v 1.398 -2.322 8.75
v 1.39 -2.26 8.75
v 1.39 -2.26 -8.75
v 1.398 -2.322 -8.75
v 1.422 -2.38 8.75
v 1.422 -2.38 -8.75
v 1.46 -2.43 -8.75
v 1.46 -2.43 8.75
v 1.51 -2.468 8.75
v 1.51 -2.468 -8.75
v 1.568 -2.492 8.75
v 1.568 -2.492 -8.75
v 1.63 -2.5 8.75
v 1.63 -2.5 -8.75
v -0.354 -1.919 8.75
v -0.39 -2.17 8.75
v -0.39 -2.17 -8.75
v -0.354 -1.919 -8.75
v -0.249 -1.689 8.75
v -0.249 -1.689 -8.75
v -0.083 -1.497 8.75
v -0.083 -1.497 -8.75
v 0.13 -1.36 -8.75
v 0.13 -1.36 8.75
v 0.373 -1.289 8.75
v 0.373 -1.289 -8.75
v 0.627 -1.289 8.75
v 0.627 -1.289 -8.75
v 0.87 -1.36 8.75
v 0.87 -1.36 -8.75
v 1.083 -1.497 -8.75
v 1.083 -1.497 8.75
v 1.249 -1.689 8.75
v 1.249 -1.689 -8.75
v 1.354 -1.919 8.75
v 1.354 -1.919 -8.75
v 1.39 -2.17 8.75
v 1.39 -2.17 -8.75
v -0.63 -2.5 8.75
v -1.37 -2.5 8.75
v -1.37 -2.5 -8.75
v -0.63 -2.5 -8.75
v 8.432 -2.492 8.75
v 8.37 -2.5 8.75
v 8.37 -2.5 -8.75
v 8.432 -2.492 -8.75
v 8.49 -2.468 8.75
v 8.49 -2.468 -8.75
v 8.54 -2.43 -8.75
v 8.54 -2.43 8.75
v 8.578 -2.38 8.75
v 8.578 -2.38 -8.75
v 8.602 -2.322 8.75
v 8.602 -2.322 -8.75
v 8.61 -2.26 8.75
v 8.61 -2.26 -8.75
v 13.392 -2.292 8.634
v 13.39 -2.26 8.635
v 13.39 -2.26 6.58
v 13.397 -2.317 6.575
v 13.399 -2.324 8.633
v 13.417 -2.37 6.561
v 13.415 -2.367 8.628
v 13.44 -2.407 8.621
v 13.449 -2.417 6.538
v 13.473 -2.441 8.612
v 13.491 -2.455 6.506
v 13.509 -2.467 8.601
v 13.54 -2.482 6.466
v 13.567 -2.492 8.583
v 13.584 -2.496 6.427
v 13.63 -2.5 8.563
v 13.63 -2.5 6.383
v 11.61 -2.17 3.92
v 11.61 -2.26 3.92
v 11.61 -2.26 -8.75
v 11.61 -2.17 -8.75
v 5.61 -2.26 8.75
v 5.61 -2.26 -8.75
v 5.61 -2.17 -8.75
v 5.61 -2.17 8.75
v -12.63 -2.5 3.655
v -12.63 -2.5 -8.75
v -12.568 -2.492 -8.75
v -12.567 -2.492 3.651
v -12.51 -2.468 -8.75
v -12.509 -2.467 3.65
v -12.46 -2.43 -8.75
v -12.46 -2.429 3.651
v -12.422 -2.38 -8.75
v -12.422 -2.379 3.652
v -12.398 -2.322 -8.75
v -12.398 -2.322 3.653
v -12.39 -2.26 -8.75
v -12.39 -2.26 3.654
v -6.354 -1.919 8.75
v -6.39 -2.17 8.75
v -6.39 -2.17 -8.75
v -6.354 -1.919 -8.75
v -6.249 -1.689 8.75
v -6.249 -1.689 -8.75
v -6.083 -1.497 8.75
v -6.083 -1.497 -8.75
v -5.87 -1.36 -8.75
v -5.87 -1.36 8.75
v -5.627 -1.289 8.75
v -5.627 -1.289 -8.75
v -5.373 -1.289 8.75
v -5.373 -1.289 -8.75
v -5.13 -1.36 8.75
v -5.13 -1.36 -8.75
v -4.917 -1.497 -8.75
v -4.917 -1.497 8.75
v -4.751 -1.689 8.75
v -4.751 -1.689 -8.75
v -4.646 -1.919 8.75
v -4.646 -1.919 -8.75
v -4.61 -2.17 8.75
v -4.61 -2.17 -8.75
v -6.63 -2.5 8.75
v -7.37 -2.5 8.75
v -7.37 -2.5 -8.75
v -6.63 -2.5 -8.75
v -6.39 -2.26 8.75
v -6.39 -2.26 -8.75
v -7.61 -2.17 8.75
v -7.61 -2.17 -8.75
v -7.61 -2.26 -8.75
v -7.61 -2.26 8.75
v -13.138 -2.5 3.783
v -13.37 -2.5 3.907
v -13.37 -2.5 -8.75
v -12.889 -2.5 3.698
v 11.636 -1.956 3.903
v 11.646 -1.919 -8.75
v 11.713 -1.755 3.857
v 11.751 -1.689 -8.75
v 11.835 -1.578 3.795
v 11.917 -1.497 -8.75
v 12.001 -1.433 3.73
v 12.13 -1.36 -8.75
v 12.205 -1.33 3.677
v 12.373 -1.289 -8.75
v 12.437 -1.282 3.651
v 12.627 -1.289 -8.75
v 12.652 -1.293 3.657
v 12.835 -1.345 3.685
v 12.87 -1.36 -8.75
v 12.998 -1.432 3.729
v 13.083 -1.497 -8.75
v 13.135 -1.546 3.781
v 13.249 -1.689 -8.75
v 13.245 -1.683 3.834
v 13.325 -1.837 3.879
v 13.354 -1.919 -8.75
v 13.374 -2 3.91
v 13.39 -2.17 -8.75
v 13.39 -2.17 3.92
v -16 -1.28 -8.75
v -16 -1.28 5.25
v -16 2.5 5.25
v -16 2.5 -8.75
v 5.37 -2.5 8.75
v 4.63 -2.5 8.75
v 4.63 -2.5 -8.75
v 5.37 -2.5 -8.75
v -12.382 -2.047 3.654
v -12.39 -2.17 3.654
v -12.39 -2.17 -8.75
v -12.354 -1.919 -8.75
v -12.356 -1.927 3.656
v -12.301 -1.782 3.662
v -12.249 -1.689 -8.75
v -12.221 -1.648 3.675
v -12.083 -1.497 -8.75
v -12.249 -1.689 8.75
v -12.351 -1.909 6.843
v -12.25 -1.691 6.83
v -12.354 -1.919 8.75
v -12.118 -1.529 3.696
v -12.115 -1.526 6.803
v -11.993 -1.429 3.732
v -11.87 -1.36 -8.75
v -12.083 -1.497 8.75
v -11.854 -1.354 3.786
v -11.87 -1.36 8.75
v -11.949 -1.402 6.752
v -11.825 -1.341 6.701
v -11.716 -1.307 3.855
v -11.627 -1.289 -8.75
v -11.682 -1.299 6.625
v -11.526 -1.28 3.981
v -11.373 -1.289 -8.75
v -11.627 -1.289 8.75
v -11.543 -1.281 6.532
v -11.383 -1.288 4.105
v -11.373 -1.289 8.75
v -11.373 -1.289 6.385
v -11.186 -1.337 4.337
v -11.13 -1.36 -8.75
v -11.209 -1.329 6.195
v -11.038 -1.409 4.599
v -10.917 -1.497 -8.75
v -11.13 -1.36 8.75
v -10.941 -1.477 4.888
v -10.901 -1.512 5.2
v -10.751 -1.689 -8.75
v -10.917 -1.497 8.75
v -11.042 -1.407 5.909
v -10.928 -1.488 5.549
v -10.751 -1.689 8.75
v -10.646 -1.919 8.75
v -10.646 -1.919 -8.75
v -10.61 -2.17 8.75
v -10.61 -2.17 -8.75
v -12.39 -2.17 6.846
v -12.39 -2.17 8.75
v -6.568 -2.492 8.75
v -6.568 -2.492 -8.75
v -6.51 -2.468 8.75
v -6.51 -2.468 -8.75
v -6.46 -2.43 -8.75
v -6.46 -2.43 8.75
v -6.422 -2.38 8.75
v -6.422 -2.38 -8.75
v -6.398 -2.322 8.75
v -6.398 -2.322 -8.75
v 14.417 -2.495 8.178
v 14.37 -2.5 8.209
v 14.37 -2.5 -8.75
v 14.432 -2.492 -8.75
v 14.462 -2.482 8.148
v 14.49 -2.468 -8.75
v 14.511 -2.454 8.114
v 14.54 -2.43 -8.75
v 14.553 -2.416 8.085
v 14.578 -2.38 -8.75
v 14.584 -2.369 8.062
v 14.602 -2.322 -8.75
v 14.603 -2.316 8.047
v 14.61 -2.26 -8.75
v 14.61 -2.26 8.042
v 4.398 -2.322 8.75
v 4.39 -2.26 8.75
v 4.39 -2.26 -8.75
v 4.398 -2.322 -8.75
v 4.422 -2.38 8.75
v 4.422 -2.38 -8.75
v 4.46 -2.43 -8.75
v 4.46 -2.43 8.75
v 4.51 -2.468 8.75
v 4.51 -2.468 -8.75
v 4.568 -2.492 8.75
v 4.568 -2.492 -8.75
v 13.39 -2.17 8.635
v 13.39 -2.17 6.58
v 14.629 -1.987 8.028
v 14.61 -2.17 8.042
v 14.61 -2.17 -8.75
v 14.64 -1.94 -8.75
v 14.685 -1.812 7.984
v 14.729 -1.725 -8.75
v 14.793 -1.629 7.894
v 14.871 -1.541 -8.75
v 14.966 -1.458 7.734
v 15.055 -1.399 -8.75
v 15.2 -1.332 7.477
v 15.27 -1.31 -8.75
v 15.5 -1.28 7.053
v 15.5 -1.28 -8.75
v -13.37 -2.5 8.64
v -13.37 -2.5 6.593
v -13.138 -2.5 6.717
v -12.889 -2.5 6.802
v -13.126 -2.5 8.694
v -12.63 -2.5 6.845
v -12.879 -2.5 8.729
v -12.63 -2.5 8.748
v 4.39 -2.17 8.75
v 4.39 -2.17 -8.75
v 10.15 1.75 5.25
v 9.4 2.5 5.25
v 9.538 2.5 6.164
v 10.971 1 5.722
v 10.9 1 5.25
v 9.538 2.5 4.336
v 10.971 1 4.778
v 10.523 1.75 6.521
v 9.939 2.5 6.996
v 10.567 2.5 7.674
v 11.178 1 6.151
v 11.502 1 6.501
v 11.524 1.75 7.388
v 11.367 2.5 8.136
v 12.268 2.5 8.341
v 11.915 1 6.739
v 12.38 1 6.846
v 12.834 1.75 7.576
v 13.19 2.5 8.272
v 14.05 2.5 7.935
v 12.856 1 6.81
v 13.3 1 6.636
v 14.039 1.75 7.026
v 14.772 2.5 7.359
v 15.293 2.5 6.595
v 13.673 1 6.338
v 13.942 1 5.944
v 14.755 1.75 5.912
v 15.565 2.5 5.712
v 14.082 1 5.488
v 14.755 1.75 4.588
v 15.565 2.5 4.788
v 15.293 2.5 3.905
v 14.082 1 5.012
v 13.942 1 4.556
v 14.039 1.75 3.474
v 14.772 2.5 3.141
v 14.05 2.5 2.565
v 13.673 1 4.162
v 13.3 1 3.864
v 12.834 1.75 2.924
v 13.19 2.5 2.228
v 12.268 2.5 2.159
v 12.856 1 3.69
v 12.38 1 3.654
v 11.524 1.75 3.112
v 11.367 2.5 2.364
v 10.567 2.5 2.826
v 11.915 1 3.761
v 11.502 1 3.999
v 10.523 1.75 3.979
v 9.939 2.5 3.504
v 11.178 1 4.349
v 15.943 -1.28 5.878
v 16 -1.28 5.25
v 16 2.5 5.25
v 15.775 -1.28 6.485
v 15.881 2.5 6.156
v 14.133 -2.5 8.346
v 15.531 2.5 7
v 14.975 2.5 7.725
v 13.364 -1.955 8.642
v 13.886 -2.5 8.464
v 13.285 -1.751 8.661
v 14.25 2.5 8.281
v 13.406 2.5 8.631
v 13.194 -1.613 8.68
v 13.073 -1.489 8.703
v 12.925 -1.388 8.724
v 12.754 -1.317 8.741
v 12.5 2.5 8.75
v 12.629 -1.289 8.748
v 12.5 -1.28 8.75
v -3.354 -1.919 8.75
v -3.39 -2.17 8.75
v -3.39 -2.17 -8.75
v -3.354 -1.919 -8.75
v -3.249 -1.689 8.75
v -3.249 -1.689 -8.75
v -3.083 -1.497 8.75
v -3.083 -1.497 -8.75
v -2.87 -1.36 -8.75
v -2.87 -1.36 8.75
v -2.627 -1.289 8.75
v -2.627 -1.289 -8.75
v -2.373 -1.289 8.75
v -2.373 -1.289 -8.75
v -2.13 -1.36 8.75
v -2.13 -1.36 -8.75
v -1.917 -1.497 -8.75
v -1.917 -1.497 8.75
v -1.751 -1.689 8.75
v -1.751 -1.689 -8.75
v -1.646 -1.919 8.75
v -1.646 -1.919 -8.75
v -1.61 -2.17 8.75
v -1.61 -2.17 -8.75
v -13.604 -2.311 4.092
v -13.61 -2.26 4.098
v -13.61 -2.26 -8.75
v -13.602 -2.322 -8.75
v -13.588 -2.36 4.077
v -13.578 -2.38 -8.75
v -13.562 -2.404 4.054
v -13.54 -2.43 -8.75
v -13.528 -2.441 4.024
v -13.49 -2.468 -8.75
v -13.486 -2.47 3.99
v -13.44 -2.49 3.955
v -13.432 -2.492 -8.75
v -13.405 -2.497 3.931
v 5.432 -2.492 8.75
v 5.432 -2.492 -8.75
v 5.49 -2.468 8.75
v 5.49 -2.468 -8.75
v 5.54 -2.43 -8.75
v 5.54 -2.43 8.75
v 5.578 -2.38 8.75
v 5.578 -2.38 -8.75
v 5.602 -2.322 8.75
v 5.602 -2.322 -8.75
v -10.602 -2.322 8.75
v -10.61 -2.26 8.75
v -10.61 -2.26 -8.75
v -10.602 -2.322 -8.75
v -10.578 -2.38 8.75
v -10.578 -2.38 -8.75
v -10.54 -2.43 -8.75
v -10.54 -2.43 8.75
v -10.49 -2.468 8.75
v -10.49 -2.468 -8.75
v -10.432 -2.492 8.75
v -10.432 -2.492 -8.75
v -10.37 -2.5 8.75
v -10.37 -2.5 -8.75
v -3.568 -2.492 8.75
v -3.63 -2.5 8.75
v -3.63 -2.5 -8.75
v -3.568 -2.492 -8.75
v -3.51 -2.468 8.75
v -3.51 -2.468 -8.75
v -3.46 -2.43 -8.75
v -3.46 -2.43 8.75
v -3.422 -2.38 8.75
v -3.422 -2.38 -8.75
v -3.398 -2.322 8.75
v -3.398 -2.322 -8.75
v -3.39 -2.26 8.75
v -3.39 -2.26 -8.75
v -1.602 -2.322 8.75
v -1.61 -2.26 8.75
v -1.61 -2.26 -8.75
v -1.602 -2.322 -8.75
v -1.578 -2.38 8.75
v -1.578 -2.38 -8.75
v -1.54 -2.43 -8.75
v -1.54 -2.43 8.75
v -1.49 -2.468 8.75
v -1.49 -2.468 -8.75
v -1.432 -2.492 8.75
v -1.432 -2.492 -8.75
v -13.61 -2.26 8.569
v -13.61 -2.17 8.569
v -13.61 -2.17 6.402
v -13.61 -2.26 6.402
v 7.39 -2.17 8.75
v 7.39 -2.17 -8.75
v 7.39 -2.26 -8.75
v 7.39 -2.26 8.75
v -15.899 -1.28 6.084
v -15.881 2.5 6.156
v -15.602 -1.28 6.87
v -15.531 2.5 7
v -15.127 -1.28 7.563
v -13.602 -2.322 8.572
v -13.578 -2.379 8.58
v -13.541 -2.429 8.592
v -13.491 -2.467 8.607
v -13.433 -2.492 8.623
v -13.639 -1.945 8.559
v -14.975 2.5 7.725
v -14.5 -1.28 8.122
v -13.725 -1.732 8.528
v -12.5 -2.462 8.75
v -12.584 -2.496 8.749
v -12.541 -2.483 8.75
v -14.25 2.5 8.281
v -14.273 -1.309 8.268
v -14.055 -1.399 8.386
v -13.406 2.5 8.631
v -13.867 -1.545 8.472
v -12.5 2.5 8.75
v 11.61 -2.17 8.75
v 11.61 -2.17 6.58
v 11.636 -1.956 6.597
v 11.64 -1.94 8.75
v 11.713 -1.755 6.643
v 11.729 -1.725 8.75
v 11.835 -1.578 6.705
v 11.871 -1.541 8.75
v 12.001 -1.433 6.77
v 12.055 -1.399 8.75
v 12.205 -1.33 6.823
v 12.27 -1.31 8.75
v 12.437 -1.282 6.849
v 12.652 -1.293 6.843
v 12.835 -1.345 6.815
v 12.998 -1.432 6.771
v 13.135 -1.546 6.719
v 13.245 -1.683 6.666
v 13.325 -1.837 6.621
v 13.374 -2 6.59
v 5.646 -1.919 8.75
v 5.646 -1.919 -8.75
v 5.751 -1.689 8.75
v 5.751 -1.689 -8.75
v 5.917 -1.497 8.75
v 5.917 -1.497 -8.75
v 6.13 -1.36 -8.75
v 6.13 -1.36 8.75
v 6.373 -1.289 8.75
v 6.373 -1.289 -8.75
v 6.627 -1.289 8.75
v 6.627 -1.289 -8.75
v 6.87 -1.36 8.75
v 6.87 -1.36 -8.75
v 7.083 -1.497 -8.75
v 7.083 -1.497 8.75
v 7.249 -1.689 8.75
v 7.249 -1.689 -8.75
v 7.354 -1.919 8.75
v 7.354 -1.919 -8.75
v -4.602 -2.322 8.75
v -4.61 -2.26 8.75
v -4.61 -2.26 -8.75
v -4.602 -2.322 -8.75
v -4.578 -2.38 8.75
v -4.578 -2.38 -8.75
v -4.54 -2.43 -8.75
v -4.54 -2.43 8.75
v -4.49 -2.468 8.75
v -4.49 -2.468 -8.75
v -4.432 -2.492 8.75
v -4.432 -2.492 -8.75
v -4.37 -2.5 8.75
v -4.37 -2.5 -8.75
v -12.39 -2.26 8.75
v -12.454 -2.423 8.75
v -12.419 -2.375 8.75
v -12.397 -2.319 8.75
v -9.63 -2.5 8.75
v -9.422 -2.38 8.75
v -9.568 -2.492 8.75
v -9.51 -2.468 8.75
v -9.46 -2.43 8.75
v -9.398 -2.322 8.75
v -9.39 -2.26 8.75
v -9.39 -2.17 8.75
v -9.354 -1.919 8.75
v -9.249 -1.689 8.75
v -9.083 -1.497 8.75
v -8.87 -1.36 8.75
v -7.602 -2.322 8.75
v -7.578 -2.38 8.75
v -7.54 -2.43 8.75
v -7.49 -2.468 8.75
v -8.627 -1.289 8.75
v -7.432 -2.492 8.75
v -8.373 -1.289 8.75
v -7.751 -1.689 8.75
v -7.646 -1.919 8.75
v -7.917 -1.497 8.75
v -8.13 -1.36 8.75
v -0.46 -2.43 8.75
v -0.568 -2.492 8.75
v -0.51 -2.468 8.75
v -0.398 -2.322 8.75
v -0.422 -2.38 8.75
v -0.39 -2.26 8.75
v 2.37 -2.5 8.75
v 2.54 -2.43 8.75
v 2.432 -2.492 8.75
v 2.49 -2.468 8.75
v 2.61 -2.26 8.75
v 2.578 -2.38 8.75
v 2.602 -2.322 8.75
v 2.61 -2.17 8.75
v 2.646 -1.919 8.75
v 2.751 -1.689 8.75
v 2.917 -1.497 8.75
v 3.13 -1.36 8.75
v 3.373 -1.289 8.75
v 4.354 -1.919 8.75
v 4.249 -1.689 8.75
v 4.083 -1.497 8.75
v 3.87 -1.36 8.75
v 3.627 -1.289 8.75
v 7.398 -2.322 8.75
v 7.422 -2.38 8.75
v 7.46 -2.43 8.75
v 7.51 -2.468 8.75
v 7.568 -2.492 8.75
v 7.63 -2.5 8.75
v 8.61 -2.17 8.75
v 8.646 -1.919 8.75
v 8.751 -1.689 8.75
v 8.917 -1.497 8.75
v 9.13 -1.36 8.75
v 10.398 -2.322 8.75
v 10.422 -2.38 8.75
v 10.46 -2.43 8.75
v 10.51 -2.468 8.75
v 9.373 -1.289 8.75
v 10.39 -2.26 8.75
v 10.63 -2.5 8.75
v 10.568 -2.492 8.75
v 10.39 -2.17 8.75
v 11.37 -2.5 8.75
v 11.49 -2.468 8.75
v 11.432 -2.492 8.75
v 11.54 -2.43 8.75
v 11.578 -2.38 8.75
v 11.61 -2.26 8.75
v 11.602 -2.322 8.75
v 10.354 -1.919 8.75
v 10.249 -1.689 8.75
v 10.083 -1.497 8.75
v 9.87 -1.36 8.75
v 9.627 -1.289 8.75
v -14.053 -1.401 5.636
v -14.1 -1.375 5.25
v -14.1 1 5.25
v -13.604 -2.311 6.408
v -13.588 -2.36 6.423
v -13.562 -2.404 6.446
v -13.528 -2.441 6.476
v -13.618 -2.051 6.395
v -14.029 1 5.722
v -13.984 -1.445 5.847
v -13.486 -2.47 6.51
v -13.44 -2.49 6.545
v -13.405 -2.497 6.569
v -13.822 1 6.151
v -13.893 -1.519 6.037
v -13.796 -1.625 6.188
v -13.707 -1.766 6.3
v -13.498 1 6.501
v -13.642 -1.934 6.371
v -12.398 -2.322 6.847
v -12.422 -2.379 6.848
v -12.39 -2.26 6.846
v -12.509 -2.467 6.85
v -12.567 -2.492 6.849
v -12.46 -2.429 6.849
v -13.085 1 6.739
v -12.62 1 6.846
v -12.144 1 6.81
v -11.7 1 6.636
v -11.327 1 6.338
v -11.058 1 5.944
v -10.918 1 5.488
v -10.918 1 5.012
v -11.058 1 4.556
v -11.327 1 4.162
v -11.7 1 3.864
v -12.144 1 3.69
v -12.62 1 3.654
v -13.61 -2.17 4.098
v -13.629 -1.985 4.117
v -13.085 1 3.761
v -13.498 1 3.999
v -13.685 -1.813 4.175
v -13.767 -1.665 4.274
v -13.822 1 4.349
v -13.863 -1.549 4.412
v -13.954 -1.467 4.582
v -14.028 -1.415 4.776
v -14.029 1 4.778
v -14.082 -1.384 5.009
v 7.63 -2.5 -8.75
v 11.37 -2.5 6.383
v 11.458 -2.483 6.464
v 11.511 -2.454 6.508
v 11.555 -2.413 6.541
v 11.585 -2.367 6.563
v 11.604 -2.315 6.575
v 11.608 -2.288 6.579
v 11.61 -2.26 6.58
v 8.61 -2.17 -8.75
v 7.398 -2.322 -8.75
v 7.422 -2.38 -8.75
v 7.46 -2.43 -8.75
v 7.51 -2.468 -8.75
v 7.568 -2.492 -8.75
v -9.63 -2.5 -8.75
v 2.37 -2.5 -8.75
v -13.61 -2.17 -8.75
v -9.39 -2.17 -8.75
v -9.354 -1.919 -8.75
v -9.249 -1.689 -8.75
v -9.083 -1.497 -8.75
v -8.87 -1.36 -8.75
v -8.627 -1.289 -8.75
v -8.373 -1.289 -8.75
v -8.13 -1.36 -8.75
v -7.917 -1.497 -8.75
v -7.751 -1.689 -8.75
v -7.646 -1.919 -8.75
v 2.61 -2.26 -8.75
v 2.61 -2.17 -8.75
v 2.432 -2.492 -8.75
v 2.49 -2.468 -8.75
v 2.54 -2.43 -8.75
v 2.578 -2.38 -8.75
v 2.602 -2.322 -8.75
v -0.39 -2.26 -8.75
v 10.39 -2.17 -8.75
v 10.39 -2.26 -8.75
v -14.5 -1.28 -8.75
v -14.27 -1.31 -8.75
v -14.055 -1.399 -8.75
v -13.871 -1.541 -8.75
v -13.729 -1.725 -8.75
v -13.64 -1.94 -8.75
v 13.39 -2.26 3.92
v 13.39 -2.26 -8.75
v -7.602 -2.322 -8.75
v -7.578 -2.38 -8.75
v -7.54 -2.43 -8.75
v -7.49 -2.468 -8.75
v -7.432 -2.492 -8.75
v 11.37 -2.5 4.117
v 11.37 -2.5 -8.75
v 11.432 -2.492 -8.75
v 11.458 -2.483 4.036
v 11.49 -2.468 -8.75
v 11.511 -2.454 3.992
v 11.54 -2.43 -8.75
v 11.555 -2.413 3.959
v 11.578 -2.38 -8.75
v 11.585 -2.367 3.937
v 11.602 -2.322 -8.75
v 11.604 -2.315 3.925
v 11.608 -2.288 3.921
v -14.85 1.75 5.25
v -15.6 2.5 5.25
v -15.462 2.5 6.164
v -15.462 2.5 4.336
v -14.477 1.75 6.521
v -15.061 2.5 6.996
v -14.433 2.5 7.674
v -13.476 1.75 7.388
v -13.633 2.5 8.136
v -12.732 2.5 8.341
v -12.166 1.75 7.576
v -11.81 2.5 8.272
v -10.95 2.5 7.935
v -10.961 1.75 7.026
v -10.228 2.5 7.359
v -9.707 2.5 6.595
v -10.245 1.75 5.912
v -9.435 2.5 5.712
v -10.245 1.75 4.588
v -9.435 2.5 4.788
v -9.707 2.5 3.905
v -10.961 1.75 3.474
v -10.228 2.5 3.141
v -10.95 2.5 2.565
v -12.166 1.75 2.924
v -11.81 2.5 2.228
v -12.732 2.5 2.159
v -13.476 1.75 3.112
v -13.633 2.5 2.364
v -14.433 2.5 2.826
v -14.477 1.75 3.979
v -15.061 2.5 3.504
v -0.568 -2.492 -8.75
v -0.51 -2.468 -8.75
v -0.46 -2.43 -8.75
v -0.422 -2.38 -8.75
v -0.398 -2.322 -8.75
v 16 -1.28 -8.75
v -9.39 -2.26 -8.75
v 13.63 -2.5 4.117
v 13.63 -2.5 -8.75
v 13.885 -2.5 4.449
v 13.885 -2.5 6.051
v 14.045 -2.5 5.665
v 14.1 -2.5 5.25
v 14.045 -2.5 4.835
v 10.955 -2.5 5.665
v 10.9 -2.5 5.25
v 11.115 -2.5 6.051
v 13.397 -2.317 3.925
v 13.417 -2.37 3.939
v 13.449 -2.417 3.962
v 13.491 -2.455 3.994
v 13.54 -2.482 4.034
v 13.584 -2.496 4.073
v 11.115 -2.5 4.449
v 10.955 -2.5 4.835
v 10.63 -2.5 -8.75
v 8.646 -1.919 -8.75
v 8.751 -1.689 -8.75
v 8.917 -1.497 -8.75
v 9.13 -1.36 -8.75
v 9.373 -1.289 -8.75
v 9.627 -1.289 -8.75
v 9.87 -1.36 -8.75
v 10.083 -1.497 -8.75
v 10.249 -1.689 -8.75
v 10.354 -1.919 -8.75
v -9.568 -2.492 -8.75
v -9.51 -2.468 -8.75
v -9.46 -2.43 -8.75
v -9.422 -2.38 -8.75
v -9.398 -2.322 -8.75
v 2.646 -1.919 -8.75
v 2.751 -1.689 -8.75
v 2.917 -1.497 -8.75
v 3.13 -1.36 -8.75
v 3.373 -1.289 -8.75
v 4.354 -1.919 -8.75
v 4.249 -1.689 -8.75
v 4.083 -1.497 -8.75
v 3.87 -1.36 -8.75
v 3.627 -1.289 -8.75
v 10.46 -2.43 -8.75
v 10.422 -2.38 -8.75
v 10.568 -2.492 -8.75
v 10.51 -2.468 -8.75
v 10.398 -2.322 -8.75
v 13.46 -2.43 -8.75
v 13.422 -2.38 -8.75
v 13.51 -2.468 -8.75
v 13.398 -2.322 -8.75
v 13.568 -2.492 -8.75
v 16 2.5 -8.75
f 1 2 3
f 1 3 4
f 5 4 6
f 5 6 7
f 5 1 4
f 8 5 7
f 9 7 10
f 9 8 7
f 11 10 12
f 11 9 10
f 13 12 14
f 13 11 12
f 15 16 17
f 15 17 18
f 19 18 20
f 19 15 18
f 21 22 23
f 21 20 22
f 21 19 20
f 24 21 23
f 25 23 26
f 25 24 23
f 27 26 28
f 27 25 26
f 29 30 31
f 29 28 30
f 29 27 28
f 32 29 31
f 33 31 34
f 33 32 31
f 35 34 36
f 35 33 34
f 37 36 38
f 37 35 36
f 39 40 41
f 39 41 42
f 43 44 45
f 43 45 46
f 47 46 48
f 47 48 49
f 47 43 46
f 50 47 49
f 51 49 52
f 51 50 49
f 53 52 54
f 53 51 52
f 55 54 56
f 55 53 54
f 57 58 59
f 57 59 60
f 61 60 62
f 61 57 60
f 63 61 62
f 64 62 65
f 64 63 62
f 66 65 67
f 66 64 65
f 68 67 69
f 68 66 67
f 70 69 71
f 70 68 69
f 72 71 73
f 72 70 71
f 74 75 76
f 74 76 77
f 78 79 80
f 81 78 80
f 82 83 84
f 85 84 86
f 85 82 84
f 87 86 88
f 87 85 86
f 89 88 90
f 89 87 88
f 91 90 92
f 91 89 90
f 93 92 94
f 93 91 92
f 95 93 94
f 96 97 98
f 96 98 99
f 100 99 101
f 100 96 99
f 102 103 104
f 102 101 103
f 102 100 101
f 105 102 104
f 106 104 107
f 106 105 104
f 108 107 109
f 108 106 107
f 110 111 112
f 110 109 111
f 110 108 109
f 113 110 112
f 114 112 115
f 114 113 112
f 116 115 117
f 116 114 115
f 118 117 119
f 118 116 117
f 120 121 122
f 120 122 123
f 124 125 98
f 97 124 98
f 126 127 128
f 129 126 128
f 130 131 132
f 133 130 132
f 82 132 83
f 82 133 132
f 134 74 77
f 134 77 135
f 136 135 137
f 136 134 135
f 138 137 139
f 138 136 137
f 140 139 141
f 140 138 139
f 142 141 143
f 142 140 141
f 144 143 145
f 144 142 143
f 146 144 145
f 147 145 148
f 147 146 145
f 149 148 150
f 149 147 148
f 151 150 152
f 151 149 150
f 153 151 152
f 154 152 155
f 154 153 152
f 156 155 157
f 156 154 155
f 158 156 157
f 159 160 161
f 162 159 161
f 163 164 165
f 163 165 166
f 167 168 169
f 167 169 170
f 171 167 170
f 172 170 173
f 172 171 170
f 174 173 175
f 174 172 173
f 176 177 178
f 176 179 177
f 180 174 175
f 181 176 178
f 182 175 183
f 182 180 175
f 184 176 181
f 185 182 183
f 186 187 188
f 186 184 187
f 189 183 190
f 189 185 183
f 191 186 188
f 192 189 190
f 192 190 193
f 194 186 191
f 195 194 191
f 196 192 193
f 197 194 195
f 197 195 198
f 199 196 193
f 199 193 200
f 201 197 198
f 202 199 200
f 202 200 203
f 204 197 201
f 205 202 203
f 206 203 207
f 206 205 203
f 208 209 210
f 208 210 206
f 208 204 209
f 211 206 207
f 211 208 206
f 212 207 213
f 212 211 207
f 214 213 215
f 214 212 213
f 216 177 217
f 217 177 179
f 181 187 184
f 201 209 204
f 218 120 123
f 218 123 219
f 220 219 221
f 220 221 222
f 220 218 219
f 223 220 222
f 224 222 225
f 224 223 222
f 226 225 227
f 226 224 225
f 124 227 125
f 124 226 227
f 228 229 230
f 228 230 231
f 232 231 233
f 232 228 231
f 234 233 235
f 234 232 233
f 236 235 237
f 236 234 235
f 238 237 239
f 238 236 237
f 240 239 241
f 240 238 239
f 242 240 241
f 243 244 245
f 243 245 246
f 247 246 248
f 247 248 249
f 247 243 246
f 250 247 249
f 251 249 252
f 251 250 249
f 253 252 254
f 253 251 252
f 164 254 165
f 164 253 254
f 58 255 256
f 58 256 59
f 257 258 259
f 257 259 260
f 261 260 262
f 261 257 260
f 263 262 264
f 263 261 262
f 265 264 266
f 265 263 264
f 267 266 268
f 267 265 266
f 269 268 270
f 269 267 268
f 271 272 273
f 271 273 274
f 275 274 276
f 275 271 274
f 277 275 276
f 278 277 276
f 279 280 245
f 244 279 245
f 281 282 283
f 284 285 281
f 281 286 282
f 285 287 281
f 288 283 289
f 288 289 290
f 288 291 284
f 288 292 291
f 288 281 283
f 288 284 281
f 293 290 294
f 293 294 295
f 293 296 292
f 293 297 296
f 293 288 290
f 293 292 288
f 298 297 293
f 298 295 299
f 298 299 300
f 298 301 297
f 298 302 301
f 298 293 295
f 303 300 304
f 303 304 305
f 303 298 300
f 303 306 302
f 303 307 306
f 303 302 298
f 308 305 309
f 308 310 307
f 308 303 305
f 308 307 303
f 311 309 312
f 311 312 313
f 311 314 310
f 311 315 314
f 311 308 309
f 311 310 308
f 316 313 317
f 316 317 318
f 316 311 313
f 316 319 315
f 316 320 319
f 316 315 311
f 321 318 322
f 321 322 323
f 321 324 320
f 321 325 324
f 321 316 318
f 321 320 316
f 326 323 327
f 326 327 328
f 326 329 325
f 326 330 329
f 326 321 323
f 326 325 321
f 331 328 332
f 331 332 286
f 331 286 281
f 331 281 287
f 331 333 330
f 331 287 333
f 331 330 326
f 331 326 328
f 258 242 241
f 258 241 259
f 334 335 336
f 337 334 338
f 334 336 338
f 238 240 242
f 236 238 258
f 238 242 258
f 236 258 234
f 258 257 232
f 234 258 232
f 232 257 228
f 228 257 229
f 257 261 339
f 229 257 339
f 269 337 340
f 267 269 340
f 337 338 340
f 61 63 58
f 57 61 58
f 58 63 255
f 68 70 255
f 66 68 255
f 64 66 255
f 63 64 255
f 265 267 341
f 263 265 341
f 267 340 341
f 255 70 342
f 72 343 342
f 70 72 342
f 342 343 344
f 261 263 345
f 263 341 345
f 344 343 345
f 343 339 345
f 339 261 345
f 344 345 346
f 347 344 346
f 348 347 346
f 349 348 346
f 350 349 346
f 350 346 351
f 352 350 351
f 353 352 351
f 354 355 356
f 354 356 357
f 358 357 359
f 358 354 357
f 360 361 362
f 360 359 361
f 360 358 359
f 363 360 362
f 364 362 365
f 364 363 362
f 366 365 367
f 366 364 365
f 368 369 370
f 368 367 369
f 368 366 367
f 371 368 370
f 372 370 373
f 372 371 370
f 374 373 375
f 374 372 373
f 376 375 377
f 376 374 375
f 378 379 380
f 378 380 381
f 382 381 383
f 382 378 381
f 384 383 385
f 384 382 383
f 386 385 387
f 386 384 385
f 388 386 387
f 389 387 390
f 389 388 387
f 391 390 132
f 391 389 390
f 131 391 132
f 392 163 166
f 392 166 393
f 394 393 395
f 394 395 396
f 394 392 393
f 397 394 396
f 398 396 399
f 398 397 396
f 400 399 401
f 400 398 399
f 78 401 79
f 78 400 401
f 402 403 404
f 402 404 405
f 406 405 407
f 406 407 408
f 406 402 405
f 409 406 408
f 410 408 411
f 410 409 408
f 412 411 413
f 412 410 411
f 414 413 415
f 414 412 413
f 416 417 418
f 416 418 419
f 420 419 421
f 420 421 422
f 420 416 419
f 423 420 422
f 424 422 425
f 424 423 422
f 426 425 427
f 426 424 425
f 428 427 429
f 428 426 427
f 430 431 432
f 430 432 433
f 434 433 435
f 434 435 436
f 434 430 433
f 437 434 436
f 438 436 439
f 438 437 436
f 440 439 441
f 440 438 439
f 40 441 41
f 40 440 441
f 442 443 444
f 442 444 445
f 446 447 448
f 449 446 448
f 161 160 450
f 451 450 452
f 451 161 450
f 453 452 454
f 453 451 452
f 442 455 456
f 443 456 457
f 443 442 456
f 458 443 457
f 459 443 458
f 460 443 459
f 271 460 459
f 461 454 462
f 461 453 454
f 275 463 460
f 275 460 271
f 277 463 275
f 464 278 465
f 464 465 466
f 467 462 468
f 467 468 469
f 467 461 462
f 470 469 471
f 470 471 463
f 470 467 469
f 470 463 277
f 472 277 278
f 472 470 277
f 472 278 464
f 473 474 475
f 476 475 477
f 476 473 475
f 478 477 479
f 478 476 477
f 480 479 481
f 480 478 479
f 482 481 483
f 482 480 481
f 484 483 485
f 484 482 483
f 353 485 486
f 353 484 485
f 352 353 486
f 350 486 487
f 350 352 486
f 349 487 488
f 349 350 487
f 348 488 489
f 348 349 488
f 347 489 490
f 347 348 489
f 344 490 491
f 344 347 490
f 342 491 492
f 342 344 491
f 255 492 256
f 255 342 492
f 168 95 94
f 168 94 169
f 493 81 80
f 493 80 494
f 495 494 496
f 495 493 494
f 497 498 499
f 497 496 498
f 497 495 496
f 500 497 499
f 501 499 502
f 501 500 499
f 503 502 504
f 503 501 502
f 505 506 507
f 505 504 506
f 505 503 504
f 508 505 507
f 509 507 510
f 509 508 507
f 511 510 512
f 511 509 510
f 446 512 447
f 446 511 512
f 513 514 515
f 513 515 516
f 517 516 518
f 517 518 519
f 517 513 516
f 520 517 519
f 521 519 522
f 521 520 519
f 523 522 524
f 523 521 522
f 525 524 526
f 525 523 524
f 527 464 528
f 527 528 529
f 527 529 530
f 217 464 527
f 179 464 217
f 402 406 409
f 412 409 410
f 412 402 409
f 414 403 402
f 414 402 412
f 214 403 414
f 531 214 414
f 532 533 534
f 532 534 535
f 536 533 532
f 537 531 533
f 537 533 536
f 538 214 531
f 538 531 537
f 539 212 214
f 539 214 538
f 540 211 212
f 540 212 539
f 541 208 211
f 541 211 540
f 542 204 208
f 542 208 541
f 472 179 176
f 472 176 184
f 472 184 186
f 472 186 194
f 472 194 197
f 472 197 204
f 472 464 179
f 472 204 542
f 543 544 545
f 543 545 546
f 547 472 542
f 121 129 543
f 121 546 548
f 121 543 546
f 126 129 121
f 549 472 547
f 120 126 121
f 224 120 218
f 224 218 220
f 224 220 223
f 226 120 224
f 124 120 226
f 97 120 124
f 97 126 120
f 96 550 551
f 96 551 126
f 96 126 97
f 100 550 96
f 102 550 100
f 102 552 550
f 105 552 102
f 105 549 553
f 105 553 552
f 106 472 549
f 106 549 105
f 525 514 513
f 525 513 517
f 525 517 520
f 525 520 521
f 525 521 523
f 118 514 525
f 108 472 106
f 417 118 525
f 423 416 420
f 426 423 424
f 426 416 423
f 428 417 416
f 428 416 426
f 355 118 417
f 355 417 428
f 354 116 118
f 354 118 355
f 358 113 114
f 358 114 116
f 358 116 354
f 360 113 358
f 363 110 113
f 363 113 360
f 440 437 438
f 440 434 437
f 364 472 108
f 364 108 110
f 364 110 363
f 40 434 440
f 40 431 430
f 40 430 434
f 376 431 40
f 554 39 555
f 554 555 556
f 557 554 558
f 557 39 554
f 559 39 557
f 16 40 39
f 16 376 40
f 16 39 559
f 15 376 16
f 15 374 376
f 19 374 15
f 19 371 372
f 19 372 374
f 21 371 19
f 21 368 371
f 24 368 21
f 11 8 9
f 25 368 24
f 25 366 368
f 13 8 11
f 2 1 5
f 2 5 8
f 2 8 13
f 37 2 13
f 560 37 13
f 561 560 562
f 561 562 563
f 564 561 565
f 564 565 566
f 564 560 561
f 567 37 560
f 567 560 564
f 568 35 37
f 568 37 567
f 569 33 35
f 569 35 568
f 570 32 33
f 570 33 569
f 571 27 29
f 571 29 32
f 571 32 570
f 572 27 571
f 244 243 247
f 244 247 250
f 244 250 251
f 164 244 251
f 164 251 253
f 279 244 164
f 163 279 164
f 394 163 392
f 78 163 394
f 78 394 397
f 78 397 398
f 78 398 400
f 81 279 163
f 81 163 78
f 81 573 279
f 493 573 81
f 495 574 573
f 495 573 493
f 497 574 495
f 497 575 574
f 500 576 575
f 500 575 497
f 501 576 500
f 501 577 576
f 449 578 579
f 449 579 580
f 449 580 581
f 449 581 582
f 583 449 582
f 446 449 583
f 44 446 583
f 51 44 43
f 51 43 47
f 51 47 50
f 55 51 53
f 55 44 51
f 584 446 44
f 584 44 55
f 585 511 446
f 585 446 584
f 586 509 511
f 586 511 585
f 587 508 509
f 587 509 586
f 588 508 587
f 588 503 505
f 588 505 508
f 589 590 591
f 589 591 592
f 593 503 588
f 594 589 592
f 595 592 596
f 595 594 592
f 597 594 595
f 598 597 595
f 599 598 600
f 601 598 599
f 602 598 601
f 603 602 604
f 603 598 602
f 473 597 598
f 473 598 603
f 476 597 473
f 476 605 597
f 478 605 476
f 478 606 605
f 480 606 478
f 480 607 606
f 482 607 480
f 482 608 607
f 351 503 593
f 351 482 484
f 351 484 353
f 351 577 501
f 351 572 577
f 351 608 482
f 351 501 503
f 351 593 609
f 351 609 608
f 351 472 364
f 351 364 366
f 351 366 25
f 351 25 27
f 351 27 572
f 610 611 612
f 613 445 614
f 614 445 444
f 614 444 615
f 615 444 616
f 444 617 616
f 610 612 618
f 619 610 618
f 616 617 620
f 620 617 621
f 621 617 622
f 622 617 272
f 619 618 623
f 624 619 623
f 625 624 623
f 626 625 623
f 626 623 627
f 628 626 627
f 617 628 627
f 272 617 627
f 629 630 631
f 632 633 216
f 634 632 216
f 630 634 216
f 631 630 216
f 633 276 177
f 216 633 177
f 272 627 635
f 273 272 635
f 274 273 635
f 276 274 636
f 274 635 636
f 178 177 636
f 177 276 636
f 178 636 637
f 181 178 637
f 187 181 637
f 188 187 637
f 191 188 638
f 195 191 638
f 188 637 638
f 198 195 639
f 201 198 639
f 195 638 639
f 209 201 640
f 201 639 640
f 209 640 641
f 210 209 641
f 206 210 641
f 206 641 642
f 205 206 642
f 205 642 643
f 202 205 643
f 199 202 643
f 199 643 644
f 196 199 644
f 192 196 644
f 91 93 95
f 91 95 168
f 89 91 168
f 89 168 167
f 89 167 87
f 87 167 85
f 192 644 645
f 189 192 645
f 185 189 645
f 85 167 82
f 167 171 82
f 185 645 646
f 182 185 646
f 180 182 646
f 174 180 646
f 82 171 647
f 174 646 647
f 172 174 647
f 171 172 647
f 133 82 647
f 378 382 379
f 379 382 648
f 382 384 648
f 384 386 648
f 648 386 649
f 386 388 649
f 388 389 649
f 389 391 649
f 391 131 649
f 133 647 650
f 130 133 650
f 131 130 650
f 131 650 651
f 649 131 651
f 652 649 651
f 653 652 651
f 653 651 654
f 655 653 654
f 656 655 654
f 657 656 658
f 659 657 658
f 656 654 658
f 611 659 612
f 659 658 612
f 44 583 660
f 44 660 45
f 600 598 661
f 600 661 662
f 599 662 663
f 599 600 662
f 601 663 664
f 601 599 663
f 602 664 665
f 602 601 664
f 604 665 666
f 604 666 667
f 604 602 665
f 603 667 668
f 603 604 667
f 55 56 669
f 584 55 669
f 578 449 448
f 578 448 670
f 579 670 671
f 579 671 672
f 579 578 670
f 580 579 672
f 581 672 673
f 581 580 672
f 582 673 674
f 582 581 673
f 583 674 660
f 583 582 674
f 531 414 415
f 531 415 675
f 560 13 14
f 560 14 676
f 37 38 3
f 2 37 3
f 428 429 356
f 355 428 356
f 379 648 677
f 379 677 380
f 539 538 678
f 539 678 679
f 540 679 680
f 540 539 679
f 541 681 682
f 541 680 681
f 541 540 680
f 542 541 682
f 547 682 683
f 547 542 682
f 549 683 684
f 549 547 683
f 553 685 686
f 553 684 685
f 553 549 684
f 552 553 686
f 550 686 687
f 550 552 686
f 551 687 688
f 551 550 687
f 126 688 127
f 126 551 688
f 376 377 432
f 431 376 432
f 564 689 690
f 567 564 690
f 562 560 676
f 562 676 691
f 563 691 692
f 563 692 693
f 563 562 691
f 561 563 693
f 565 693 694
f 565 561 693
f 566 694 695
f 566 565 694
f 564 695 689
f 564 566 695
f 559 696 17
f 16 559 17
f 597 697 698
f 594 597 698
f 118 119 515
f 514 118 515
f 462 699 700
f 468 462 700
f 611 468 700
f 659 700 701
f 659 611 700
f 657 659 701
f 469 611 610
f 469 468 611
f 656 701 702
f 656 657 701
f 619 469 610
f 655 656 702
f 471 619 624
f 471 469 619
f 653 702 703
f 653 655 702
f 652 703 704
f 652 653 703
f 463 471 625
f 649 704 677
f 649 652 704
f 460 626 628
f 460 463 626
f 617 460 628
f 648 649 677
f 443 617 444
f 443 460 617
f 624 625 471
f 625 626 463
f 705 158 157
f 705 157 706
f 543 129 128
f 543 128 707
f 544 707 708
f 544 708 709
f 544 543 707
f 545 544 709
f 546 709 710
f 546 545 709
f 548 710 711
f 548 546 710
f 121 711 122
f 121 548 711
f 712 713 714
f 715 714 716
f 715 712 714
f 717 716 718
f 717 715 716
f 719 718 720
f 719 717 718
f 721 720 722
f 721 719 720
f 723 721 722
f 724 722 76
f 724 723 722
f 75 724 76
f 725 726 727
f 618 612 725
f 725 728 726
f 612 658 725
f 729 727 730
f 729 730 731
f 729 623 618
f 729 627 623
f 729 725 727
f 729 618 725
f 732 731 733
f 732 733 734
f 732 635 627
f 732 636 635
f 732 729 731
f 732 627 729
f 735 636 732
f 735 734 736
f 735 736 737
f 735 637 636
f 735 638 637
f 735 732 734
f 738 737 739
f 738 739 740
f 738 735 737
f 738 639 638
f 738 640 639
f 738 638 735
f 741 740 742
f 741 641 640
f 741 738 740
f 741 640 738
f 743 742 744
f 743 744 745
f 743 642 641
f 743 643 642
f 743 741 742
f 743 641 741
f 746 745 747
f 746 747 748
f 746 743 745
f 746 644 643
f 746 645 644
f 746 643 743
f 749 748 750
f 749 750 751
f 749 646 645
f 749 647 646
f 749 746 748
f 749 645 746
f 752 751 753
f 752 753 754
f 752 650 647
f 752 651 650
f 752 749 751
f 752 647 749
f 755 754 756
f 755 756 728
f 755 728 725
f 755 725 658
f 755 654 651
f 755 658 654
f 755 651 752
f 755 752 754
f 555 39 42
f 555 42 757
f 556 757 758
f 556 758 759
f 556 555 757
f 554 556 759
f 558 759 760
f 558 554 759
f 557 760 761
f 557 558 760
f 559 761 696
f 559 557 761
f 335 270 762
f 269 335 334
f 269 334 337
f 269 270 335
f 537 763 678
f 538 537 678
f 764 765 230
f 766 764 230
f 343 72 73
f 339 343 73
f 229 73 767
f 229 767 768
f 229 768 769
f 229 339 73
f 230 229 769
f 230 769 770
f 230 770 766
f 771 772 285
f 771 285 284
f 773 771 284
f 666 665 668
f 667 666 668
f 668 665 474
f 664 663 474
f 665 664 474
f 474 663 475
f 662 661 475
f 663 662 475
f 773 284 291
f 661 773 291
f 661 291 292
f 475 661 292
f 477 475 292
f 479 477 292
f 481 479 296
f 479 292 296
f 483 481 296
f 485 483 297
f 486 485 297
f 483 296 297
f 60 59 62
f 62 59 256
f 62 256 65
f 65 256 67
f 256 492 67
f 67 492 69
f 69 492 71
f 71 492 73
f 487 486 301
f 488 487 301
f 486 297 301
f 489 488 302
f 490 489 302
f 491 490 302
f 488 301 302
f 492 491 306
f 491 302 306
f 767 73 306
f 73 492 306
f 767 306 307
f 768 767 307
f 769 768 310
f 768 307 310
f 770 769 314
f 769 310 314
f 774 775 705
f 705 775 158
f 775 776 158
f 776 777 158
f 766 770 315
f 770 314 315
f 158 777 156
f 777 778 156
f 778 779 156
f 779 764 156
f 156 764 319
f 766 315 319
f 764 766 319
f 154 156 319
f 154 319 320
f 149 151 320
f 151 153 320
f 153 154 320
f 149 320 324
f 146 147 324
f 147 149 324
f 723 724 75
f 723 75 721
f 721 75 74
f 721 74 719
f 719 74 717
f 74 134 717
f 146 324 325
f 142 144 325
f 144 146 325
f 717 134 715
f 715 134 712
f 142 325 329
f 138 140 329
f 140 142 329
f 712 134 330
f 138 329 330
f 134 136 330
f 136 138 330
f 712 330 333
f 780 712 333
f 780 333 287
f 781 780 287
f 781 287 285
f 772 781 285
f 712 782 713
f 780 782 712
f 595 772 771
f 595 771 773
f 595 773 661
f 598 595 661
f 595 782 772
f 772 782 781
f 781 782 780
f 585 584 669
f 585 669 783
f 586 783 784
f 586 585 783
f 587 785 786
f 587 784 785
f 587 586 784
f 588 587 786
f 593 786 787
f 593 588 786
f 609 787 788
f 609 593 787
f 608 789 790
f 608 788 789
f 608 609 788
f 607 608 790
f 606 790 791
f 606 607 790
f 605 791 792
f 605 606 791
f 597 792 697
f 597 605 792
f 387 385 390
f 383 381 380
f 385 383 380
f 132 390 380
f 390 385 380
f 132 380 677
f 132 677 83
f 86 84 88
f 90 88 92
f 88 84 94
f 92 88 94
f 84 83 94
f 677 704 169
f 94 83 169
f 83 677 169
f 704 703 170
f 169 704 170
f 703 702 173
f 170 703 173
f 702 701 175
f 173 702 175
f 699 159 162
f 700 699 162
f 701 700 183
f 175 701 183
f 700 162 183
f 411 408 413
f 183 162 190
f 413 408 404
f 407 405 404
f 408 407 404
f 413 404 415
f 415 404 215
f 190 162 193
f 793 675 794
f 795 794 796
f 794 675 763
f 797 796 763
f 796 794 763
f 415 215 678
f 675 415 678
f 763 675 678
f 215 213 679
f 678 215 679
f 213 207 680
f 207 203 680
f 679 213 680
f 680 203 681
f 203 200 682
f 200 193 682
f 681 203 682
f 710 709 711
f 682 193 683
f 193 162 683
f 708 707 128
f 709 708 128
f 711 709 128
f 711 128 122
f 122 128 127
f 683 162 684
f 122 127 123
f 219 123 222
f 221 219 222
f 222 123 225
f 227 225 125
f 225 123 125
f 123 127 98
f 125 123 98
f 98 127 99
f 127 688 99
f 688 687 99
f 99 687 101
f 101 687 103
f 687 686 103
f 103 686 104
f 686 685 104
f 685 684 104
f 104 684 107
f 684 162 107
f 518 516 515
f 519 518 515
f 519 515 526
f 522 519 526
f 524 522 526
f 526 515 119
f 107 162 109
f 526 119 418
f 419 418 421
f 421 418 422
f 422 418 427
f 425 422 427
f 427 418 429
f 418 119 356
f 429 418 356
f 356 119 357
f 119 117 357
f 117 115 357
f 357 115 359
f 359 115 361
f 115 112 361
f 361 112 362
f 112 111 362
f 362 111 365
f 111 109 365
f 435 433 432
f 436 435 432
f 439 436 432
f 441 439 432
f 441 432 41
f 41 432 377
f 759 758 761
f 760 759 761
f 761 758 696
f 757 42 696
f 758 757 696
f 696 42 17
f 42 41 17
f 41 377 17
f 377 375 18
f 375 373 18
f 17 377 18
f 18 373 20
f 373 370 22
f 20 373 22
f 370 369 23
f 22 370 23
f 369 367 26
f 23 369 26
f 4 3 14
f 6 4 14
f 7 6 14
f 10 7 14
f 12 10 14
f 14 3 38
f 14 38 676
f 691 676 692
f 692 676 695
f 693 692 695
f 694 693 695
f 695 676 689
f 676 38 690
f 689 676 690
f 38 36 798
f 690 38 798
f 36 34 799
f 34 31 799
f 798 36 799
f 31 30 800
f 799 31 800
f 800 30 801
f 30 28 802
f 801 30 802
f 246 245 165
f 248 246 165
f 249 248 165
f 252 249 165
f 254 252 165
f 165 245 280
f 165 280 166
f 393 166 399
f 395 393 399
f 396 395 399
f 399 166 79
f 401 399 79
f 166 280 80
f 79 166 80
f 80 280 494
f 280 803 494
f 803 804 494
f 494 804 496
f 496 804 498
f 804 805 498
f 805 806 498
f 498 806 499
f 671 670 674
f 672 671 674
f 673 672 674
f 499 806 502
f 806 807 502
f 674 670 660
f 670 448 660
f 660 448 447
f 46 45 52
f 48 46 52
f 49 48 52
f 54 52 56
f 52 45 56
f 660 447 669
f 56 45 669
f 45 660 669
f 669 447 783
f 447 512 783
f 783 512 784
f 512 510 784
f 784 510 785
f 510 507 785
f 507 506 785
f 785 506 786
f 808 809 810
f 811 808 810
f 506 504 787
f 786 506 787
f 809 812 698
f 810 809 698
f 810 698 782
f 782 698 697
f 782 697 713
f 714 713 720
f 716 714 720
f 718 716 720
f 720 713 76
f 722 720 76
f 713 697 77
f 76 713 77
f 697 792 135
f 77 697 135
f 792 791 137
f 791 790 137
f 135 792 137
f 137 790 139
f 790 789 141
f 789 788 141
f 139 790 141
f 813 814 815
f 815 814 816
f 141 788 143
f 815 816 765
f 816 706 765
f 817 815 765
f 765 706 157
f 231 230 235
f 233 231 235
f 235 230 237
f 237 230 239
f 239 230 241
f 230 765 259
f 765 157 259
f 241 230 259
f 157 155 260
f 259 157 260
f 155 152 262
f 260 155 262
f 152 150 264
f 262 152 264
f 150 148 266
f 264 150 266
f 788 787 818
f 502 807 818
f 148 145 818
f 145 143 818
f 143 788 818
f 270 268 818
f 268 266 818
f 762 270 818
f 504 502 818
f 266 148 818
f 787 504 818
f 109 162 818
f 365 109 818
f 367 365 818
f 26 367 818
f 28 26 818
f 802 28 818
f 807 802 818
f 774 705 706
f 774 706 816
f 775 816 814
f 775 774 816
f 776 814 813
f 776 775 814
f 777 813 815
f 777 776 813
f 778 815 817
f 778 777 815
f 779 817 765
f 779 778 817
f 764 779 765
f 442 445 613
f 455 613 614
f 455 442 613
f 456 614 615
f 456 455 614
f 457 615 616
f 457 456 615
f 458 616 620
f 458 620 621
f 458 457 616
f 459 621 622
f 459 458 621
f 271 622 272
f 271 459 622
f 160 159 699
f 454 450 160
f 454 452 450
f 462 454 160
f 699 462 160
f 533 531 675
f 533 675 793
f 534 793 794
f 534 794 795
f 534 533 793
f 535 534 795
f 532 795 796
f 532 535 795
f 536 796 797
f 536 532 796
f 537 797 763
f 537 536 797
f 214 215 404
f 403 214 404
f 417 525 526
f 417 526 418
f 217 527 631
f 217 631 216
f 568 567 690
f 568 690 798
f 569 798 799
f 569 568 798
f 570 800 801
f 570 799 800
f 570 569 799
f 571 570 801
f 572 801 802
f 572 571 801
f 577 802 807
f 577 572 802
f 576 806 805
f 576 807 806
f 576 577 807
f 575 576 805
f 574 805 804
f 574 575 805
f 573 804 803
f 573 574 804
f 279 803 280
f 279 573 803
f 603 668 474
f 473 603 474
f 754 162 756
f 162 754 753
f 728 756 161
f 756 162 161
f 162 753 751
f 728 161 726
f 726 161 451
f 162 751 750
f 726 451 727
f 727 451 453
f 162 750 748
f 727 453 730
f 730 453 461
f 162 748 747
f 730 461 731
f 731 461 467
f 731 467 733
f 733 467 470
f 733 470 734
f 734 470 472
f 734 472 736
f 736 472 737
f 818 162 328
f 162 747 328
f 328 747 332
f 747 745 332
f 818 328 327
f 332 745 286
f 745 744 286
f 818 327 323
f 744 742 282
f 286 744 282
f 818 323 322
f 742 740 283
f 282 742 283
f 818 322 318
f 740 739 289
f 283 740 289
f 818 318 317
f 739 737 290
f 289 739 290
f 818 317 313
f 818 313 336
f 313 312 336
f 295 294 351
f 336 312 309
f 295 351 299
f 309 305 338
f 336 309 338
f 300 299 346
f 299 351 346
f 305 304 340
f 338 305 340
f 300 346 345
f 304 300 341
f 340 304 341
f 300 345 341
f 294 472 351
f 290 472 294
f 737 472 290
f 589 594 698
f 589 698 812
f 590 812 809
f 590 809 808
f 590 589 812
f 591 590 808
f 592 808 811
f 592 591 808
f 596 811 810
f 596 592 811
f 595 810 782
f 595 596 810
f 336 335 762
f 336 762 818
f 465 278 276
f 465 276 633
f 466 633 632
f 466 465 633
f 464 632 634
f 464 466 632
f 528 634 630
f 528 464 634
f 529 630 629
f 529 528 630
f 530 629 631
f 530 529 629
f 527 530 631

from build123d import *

# Parameters (mm, degrees)
SKETCH_1_W             = 32
SKETCH_1_H             = 5
EXTRUDE_1_DEPTH        = 8.75
CUT_EXTRUDE_1_DEPTH    = 24.843238035
PATTERN_LINEAR_1_COUNT = 11
PATTERN_LINEAR_1_PITCH = 3
SKETCH_3_W             = 1.5
SKETCH_3_H             = 1.22
SKETCH_3_W_2           = 0.5
CUT_EXTRUDE_2_DEPTH    = 24.843238035
SKETCH_4_R             = 1.6
CUT_EXTRUDE_3_DEPTH    = 19.909323097
CHAMFER_1_SIZE         = 1.5
FILLET_1_R             = 3.5


with BuildPart() as part:
    # 草图1 → 凸台-拉伸1 (new, symmetric)
    with BuildSketch(Plane.XY):
        Rectangle(SKETCH_1_W, SKETCH_1_H)
    extrude(amount=EXTRUDE_1_DEPTH, both=True)

    # 草图2 → 切除-拉伸1 (cut, through all)
    with BuildSketch(Plane.XY.offset(8.75)):
        with BuildLine():
            Line((-16, -2.5), (-15.63, -2.5))
            ThreePointArc((-15.63, -2.5), (-15.460294373, -2.429705627), (-15.39, -2.26))
            Line((-15.39, -2.26), (-15.39, -2.17))
            ThreePointArc((-15.39, -2.17), (-14.5, -1.28), (-13.61, -2.17))
            Line((-13.61, -2.17), (-13.61, -2.26))
            ThreePointArc((-13.61, -2.26), (-13.539705627, -2.429705627), (-13.37, -2.5))
            Line((-13.37, -2.5), (-13, -2.5))
            Line((-13, -2.5), (-13, -3.5))
            Line((-13, -3.5), (-16, -3.5))
            Line((-16, -3.5), (-16, -2.5))
        make_face()
    cut_extrude_1 = extrude(amount=-CUT_EXTRUDE_1_DEPTH, mode=Mode.SUBTRACT)

    # 阵列(线性)1: 切除-拉伸1 ×11
    with Locations(*[(i * PATTERN_LINEAR_1_PITCH, 0, 0) for i in range(1, PATTERN_LINEAR_1_COUNT)]):
        add(cut_extrude_1, mode=Mode.SUBTRACT)

    # 草图3 → 切除-拉伸2 (cut, through all)
    with BuildSketch(Plane.XY.offset(8.75)):
        with Locations((-15.25, -1.89)):
            Rectangle(SKETCH_3_W, SKETCH_3_H)
        with Locations((15.75, -1.89)):
            Rectangle(SKETCH_3_W_2, SKETCH_3_H)
    extrude(amount=-CUT_EXTRUDE_2_DEPTH, mode=Mode.SUBTRACT)

    # 草图4 → 切除-拉伸3 (cut, through all)
    with BuildSketch(Plane(origin=(0, 2.5, 0), x_dir=(1, 0, 0), z_dir=(0, 1, 0))):
        with Locations(Location((-12.5, -5.25, 0), (0, 0, 180))):
            Circle(SKETCH_4_R)
        with Locations(Location((12.5, -5.25, 0), (0, 0, 180))):
            Circle(SKETCH_4_R)
    extrude(amount=-CUT_EXTRUDE_3_DEPTH, mode=Mode.SUBTRACT)

    # 倒角1
    chamfer_1_edges = [part.edges().sort_by_distance(p)[0] for p in [
        (-10.9, 2.5, 5.25),
        (14.1, 2.5, 5.25),
    ]]
    chamfer(chamfer_1_edges, length=CHAMFER_1_SIZE)

    # 圆角1
    fillet_1_edges = [part.edges().sort_by_distance(p)[0] for p in [
        (-16, 0.61, 8.75),
        (16, 0.61, 8.75),
    ]]
    fillet(fillet_1_edges, radius=FILLET_1_R)


solid = part.part
